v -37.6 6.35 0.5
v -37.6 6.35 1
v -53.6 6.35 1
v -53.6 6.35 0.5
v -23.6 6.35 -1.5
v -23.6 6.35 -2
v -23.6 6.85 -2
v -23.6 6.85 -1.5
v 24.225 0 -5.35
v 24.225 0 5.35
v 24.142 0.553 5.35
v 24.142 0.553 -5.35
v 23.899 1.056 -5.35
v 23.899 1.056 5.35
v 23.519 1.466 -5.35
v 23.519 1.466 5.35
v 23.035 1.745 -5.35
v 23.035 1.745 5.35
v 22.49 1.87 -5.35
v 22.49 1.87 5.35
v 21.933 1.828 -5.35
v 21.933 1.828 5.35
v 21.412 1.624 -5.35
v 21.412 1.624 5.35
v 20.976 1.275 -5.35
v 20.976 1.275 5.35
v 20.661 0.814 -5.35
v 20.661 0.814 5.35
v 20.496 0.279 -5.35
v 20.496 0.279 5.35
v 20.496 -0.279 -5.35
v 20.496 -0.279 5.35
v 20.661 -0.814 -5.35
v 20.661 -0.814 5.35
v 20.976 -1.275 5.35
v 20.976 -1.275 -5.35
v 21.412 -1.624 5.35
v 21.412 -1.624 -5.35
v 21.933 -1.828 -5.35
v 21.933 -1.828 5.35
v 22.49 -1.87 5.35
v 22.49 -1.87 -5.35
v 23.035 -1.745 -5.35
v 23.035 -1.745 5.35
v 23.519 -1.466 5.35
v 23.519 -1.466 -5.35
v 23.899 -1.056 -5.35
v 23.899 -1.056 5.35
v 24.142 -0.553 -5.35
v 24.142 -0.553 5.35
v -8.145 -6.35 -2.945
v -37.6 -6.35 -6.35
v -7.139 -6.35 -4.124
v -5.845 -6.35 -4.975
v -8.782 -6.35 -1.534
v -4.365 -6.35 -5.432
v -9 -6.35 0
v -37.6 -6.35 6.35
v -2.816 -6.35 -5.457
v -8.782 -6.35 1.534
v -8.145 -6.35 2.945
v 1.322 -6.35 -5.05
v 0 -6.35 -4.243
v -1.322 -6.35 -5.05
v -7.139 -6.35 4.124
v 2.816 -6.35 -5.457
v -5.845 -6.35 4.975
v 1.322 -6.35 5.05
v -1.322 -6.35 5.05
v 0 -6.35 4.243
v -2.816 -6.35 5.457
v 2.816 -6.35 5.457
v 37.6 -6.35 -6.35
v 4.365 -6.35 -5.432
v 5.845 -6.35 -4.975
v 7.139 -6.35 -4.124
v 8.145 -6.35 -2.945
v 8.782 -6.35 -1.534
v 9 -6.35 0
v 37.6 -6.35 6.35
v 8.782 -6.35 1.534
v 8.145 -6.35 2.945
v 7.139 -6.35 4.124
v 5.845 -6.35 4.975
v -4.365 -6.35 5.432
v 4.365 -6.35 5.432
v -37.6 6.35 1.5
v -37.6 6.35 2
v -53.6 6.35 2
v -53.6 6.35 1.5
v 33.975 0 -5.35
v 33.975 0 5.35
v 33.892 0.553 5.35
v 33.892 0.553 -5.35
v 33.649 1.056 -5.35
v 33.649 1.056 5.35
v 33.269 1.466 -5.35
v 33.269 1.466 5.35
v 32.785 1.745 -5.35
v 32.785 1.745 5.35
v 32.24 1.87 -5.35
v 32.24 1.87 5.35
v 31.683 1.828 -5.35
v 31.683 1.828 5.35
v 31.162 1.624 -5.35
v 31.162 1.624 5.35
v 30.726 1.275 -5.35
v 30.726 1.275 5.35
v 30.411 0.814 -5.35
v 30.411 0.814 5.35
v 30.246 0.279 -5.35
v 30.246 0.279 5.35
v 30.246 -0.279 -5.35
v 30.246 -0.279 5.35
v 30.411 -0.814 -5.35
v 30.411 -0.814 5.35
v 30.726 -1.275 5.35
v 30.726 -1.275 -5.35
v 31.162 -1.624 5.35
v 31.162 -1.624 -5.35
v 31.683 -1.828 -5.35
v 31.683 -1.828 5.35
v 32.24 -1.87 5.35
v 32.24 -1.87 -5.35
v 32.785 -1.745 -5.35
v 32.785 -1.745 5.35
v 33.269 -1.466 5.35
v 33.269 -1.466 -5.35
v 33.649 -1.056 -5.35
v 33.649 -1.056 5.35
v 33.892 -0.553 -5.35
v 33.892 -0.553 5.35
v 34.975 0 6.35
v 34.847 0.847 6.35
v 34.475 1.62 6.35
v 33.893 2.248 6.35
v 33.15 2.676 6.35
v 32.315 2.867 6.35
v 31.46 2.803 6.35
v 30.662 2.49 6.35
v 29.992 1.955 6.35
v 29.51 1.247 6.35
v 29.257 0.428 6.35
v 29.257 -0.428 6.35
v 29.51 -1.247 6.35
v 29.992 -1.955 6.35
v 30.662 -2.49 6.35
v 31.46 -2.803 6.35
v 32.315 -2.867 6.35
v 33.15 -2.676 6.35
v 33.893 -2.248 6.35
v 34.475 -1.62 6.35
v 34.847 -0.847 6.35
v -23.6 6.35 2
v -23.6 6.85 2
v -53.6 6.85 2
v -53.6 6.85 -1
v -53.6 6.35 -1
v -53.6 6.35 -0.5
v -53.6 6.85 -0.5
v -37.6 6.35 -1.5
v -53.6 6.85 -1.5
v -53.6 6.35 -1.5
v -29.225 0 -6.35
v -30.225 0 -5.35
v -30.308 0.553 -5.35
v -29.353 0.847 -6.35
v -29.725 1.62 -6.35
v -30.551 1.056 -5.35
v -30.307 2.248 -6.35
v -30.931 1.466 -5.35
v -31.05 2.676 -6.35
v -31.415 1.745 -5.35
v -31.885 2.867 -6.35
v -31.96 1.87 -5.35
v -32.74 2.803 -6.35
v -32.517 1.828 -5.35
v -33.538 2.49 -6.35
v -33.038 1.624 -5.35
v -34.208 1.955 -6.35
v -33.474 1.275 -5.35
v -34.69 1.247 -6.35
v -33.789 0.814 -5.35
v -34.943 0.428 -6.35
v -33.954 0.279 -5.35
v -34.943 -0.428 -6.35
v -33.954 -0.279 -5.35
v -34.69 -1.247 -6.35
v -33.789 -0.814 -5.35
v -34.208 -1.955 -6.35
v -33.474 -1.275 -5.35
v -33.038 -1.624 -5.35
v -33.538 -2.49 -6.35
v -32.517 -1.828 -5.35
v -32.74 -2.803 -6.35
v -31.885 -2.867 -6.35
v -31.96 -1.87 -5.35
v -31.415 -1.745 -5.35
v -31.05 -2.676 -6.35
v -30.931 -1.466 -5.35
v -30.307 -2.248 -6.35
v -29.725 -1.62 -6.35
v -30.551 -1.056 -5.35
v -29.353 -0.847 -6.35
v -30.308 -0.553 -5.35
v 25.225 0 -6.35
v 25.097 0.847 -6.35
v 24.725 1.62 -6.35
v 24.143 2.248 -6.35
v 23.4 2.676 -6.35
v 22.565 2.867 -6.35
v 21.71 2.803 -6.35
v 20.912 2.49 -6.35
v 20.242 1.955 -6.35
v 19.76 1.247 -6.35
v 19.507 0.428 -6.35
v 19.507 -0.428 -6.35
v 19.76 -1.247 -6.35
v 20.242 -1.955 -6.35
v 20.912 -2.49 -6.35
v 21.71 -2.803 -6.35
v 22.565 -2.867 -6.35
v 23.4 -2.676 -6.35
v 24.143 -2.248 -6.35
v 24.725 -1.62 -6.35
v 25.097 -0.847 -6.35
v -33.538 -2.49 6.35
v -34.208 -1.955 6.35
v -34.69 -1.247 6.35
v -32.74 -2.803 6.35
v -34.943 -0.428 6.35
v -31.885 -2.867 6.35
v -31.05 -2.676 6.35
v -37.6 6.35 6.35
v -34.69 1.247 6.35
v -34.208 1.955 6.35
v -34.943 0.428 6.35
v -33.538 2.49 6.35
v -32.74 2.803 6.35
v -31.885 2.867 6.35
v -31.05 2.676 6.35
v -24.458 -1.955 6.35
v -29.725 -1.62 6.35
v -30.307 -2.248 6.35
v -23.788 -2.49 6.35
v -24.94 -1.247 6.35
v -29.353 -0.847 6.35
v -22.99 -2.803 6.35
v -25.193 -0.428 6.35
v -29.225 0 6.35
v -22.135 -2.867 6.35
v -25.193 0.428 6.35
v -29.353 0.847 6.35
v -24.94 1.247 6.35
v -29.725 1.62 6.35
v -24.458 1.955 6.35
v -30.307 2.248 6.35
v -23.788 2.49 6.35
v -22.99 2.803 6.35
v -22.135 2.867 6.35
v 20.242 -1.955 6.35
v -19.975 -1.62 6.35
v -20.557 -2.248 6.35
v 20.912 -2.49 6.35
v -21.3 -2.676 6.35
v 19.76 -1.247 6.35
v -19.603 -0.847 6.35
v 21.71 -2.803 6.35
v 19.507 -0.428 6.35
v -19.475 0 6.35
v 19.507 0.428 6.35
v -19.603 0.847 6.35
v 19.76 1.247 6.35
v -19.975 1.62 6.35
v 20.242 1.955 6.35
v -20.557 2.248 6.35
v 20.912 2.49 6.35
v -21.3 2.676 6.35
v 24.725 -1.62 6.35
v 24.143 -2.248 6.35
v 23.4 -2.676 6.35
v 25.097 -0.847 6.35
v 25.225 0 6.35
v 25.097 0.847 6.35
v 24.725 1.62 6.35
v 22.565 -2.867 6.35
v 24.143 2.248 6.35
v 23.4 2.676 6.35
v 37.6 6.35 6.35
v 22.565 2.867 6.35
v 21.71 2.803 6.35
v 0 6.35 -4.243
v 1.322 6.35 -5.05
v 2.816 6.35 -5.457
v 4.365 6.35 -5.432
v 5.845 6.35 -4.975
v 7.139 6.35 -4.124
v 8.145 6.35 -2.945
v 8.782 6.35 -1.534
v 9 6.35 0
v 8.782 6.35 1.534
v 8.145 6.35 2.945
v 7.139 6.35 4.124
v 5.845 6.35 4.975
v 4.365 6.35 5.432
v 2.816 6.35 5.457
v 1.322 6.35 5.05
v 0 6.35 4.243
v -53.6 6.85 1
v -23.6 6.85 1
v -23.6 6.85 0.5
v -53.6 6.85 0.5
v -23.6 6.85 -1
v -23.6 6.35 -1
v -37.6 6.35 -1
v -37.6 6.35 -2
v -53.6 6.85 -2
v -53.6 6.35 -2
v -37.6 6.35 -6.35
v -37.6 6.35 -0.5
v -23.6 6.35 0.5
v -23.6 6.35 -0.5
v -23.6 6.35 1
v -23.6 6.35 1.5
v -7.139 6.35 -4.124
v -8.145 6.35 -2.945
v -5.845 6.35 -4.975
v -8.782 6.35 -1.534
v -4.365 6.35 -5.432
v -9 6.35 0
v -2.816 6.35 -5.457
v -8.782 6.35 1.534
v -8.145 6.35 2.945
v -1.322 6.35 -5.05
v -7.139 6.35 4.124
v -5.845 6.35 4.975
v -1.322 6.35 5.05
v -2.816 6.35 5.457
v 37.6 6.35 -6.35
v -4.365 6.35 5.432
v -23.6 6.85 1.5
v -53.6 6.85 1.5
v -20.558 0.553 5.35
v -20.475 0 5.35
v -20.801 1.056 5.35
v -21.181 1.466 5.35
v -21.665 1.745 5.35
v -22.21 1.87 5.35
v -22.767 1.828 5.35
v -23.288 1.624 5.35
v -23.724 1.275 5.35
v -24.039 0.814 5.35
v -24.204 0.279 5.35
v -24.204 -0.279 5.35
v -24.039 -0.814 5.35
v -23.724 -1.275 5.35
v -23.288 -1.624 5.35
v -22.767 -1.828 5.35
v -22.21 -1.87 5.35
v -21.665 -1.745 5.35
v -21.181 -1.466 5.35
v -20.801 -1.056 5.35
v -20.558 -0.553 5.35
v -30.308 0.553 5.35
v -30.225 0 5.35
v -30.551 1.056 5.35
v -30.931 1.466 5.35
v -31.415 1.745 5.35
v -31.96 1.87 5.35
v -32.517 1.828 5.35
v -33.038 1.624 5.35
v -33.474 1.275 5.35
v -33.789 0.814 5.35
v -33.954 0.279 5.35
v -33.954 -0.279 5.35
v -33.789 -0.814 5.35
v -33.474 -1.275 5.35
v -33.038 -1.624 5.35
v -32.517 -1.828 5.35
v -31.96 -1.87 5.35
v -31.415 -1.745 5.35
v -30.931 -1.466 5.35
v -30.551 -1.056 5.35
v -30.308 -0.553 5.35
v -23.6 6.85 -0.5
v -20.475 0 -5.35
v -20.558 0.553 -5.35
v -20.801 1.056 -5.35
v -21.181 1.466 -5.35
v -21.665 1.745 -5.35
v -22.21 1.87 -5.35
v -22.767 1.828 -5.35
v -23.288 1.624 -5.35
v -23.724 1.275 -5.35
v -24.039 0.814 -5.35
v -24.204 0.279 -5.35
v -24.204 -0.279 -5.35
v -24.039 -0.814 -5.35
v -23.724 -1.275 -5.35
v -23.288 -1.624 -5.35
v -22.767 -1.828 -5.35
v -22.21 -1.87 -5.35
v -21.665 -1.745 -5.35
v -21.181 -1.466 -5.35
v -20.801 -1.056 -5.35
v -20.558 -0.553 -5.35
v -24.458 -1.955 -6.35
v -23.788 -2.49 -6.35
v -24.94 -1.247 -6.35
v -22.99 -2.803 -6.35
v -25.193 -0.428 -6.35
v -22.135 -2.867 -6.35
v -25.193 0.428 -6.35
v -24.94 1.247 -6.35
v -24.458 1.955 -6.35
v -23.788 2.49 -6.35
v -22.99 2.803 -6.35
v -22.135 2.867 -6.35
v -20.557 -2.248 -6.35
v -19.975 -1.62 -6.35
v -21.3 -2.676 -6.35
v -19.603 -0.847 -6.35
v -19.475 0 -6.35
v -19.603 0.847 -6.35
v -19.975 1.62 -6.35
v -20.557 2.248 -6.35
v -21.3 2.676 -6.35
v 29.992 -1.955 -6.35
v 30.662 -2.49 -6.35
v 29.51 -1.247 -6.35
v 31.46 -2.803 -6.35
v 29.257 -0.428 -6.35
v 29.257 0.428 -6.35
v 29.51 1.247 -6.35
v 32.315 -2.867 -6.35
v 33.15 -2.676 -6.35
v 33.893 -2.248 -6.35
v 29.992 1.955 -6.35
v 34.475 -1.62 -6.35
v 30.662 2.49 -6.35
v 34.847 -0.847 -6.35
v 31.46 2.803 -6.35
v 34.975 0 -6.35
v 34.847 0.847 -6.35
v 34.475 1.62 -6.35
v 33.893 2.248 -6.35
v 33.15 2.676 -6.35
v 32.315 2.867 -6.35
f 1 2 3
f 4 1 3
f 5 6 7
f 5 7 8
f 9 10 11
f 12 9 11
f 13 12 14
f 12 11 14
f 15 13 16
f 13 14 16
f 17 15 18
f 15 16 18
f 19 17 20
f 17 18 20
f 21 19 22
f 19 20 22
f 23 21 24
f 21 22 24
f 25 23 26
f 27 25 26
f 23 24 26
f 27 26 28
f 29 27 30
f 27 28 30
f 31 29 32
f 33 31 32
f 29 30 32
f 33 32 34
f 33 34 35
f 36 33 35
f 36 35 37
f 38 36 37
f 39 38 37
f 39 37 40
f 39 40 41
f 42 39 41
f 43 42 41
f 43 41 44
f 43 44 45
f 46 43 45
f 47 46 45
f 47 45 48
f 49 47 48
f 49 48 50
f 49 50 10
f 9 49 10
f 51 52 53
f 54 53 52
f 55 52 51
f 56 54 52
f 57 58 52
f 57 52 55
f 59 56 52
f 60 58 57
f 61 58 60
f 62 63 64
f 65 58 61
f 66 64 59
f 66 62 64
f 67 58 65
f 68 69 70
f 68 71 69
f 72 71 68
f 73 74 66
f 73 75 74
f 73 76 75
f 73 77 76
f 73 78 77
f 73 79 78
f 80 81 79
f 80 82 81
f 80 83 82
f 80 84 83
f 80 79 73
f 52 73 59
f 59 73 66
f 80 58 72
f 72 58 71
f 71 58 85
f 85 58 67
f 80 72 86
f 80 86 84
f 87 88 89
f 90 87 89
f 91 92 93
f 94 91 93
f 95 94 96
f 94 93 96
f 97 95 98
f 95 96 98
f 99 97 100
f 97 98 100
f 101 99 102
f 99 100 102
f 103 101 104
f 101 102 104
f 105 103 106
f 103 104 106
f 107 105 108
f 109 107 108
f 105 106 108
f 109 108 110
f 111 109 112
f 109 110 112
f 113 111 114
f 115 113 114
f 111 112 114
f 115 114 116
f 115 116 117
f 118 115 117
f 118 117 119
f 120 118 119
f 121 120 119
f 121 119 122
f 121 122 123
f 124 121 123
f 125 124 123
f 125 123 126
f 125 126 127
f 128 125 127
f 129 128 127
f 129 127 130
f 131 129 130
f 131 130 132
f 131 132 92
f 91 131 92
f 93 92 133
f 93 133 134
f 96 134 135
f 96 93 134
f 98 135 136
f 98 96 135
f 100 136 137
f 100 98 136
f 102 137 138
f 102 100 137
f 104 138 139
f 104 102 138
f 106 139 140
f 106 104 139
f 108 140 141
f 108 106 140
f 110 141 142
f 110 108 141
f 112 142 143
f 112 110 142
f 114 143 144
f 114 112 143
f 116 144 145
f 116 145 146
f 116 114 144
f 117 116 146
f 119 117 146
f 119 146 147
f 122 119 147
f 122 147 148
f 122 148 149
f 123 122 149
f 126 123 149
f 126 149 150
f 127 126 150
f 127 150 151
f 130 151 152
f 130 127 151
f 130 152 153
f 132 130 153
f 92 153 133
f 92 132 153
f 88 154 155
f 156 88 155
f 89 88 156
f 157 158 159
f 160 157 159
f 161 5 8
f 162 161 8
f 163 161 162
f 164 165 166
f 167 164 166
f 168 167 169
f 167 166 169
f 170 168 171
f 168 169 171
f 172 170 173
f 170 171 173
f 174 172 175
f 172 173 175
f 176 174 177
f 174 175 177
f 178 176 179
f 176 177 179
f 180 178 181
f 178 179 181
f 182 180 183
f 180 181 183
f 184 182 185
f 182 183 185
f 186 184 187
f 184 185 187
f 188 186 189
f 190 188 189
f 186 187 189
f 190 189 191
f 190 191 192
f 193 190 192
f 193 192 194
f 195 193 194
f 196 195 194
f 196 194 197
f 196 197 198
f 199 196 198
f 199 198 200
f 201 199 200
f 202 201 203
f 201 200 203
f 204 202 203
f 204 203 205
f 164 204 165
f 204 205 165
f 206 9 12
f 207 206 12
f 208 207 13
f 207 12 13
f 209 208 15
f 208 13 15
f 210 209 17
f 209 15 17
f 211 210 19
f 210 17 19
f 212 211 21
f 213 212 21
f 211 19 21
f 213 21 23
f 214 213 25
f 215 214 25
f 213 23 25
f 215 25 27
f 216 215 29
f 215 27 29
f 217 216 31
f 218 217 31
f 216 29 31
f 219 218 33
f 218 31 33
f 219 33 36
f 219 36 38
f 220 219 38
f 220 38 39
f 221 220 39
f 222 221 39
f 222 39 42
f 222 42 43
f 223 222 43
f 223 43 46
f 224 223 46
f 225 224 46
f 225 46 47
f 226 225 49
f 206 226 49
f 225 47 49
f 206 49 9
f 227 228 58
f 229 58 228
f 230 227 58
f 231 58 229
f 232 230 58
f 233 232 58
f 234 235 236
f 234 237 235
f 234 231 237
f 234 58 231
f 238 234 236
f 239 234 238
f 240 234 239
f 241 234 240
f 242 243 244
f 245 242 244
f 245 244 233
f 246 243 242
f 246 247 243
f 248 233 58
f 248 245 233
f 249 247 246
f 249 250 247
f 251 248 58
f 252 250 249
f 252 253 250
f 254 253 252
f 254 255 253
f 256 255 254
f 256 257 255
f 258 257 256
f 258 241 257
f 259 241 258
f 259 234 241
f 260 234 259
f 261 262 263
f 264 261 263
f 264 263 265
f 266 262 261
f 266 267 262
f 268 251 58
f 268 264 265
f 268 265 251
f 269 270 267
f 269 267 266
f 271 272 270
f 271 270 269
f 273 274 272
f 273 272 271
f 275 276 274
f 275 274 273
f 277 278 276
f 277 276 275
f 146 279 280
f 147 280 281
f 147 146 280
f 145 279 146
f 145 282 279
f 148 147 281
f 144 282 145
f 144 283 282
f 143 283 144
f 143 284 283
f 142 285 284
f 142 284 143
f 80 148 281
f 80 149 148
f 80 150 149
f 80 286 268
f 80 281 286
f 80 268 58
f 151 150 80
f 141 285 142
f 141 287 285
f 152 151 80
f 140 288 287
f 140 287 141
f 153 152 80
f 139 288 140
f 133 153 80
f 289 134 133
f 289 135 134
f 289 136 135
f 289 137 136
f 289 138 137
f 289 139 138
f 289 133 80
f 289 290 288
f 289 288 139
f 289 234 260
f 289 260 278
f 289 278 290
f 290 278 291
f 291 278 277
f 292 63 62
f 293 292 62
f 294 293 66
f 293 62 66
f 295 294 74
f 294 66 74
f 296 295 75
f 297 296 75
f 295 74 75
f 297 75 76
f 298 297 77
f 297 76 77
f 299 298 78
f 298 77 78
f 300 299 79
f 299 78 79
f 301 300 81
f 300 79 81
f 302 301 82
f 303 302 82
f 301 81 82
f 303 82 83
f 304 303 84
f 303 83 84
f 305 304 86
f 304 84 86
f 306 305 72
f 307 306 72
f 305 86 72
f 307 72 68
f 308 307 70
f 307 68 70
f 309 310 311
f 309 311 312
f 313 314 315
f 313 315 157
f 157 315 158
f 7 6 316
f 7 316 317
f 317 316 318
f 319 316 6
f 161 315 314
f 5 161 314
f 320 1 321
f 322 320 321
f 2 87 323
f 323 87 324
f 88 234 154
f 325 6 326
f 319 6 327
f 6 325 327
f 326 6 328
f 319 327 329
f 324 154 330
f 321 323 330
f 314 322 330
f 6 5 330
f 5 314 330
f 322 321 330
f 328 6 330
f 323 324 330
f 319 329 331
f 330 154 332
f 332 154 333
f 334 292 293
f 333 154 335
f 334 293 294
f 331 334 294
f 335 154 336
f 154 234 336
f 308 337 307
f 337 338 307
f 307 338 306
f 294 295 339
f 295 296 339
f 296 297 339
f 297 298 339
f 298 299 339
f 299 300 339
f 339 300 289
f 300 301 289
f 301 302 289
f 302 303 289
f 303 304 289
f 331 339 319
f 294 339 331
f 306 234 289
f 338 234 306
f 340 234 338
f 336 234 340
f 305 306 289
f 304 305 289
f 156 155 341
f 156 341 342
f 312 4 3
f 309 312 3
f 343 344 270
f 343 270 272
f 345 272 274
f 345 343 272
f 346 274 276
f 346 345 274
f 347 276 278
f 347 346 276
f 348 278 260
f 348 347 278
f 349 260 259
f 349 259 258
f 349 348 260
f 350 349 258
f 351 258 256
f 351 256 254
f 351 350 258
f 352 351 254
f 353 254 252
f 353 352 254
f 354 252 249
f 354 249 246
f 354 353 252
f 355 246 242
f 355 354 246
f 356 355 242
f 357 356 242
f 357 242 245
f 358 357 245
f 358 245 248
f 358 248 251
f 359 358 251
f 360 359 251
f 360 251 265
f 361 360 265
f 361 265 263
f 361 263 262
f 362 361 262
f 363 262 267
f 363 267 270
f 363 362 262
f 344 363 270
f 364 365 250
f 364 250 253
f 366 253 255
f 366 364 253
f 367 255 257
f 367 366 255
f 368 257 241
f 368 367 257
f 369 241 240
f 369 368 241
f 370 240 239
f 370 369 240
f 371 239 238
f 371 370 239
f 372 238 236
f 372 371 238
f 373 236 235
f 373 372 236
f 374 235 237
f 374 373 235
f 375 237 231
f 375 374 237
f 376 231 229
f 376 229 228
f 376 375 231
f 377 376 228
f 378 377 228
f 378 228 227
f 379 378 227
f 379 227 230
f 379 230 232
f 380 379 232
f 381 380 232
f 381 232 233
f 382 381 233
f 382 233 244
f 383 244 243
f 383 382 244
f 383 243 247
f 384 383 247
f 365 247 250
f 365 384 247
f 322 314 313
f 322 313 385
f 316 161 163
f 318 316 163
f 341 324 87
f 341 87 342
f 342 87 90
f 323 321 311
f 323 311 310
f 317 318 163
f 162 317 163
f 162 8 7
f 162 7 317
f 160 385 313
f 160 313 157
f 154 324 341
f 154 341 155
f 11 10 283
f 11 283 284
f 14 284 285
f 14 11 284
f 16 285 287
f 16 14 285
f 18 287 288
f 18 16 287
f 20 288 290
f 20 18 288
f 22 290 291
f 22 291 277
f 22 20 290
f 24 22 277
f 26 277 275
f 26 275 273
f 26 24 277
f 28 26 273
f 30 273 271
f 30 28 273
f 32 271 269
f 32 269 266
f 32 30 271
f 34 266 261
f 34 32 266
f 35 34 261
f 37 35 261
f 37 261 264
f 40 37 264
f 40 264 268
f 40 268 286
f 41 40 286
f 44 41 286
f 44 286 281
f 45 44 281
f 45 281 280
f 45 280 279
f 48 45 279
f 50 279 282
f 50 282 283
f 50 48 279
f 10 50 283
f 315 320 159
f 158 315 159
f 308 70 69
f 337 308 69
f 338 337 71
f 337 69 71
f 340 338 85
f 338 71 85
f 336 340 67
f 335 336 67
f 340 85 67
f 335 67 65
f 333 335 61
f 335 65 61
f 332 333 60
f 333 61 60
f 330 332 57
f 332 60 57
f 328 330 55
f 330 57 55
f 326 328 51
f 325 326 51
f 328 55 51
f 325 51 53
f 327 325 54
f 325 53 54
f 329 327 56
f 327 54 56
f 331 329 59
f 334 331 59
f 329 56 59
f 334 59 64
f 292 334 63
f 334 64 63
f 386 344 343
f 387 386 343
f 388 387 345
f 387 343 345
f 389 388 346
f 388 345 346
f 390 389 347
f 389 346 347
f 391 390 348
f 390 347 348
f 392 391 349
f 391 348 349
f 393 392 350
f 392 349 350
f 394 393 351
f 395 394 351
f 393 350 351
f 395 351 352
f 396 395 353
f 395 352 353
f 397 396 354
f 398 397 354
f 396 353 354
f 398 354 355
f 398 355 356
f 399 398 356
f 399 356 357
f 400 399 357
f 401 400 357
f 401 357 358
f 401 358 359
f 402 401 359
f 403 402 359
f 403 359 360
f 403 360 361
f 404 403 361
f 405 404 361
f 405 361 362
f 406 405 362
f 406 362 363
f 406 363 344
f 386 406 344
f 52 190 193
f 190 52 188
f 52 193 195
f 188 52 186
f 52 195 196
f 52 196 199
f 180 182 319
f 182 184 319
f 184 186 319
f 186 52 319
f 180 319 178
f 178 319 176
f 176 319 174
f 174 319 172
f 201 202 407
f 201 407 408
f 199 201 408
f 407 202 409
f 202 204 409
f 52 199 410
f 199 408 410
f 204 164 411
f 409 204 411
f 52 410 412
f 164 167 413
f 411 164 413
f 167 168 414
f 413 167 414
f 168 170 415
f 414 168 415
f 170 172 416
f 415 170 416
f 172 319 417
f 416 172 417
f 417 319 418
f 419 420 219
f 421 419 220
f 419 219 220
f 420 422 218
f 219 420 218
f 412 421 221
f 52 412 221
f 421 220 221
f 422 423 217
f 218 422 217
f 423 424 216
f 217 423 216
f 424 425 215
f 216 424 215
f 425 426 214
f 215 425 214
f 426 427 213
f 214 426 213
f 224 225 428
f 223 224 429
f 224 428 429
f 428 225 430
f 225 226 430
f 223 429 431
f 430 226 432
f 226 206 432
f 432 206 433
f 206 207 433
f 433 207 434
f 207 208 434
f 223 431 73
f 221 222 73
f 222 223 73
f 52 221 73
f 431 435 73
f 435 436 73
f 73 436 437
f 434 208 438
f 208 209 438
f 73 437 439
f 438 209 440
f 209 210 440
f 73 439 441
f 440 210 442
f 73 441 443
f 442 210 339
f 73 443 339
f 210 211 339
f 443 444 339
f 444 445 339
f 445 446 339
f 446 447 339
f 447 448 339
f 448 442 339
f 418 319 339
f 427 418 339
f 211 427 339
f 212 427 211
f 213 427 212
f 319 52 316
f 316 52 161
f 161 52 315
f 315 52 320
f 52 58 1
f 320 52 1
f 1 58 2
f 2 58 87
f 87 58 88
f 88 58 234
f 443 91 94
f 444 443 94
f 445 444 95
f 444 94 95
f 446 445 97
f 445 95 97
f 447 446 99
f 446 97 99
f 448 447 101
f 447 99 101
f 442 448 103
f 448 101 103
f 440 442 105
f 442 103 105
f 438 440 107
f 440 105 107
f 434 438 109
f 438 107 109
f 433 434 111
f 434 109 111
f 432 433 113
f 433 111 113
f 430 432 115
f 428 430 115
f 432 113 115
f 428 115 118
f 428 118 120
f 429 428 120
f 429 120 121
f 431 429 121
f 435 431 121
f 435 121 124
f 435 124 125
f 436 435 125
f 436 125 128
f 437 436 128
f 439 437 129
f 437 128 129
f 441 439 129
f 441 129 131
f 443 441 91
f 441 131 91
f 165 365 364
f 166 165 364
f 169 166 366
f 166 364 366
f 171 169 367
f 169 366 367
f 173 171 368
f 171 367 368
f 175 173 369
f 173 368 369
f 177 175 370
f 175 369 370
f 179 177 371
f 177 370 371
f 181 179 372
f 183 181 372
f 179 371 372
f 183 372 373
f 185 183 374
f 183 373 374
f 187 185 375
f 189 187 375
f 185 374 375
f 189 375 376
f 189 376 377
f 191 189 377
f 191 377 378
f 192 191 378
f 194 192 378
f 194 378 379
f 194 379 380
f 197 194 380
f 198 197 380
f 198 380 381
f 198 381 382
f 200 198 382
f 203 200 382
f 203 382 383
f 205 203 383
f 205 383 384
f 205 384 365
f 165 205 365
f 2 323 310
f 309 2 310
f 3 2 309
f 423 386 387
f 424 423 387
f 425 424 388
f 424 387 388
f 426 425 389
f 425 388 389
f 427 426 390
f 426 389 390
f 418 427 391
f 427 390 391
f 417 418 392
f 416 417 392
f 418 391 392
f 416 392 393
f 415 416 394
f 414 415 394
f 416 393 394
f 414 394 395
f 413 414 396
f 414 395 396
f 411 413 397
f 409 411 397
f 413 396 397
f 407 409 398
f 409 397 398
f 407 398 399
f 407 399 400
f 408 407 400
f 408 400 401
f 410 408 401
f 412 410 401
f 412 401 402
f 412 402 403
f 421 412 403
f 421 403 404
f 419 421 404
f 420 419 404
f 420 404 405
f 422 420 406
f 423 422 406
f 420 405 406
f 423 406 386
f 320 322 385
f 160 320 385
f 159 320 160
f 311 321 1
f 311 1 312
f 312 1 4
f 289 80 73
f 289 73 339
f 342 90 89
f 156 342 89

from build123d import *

# Parameters (mm, degrees)
F0_W          = 75.2
F0_H          = 12.7
F1_DEPTH      = 6.35
F1_DEPTH_BACK = 6.35
F3_DEPTH      = 25
F4_W          = 30
F4_H          = 0.5
F5_DEPTH      = 0.5
F6_R          = 1.875
F7_DEPTH      = 25
F8_SIZE       = 1


with BuildPart() as f1:
    # F0 (on Top) → F1 (new body, two sides)
    with BuildSketch(Plane.XY) as f1_sk:
        Rectangle(F0_W, F0_H)
    extrude(amount=F1_DEPTH)
    extrude(f1_sk.sketch, amount=-F1_DEPTH_BACK)

    # F2 (on face) → F3 (cut)
    with BuildSketch(Plane.XZ.offset(6.35)):
        with BuildLine():
            ThreePointArc((0, 4.242641), (-9, 0), (0, -4.242641))
            ThreePointArc((0, -4.242641), (9, 0), (0, 4.242641))
        make_face()
    extrude(amount=-F3_DEPTH, mode=Mode.SUBTRACT)

    # F4 (on face) → F5 (join)
    with BuildSketch(Plane(origin=(0, 6.35, 0), x_dir=(-1, 0, 0), z_dir=(0, 1, 0))):
        with Locations((38.6, 1.75)):
            Rectangle(F4_W, F4_H)
        with Locations((38.6, 0.75)):
            Rectangle(F4_W, F4_H)
        with Locations((38.6, -0.75)):
            Rectangle(F4_W, F4_H)
        with Locations((38.6, -1.75)):
            Rectangle(F4_W, F4_H)
    extrude(amount=F5_DEPTH)

    # F6 (on face) → F7 (cut)
    with BuildSketch(Plane.XY.offset(6.35)):
        with Locations((32.1, 0)):
            Circle(F6_R)
        with Locations((22.35, 0)):
            Circle(F6_R)
        with Locations((-22.35, 0)):
            Circle(F6_R)
        with Locations((-32.1, 0)):
            Circle(F6_R)
    extrude(amount=-F7_DEPTH, mode=Mode.SUBTRACT)

    # F8
    f8_edges = [f1.edges().sort_by_distance(p)[0] for p in [
        (30.225, 0, 6.35),
        (20.475, 0, 6.35),
        (-24.225, 0, 6.35),
        (-33.975, 0, 6.35),
        (-33.975, 0, -6.35),
        (-24.225, 0, -6.35),
        (20.475, 0, -6.35),
        (30.225, 0, -6.35),
    ]]
    chamfer(f8_edges, length=F8_SIZE)


solid = f1.part
